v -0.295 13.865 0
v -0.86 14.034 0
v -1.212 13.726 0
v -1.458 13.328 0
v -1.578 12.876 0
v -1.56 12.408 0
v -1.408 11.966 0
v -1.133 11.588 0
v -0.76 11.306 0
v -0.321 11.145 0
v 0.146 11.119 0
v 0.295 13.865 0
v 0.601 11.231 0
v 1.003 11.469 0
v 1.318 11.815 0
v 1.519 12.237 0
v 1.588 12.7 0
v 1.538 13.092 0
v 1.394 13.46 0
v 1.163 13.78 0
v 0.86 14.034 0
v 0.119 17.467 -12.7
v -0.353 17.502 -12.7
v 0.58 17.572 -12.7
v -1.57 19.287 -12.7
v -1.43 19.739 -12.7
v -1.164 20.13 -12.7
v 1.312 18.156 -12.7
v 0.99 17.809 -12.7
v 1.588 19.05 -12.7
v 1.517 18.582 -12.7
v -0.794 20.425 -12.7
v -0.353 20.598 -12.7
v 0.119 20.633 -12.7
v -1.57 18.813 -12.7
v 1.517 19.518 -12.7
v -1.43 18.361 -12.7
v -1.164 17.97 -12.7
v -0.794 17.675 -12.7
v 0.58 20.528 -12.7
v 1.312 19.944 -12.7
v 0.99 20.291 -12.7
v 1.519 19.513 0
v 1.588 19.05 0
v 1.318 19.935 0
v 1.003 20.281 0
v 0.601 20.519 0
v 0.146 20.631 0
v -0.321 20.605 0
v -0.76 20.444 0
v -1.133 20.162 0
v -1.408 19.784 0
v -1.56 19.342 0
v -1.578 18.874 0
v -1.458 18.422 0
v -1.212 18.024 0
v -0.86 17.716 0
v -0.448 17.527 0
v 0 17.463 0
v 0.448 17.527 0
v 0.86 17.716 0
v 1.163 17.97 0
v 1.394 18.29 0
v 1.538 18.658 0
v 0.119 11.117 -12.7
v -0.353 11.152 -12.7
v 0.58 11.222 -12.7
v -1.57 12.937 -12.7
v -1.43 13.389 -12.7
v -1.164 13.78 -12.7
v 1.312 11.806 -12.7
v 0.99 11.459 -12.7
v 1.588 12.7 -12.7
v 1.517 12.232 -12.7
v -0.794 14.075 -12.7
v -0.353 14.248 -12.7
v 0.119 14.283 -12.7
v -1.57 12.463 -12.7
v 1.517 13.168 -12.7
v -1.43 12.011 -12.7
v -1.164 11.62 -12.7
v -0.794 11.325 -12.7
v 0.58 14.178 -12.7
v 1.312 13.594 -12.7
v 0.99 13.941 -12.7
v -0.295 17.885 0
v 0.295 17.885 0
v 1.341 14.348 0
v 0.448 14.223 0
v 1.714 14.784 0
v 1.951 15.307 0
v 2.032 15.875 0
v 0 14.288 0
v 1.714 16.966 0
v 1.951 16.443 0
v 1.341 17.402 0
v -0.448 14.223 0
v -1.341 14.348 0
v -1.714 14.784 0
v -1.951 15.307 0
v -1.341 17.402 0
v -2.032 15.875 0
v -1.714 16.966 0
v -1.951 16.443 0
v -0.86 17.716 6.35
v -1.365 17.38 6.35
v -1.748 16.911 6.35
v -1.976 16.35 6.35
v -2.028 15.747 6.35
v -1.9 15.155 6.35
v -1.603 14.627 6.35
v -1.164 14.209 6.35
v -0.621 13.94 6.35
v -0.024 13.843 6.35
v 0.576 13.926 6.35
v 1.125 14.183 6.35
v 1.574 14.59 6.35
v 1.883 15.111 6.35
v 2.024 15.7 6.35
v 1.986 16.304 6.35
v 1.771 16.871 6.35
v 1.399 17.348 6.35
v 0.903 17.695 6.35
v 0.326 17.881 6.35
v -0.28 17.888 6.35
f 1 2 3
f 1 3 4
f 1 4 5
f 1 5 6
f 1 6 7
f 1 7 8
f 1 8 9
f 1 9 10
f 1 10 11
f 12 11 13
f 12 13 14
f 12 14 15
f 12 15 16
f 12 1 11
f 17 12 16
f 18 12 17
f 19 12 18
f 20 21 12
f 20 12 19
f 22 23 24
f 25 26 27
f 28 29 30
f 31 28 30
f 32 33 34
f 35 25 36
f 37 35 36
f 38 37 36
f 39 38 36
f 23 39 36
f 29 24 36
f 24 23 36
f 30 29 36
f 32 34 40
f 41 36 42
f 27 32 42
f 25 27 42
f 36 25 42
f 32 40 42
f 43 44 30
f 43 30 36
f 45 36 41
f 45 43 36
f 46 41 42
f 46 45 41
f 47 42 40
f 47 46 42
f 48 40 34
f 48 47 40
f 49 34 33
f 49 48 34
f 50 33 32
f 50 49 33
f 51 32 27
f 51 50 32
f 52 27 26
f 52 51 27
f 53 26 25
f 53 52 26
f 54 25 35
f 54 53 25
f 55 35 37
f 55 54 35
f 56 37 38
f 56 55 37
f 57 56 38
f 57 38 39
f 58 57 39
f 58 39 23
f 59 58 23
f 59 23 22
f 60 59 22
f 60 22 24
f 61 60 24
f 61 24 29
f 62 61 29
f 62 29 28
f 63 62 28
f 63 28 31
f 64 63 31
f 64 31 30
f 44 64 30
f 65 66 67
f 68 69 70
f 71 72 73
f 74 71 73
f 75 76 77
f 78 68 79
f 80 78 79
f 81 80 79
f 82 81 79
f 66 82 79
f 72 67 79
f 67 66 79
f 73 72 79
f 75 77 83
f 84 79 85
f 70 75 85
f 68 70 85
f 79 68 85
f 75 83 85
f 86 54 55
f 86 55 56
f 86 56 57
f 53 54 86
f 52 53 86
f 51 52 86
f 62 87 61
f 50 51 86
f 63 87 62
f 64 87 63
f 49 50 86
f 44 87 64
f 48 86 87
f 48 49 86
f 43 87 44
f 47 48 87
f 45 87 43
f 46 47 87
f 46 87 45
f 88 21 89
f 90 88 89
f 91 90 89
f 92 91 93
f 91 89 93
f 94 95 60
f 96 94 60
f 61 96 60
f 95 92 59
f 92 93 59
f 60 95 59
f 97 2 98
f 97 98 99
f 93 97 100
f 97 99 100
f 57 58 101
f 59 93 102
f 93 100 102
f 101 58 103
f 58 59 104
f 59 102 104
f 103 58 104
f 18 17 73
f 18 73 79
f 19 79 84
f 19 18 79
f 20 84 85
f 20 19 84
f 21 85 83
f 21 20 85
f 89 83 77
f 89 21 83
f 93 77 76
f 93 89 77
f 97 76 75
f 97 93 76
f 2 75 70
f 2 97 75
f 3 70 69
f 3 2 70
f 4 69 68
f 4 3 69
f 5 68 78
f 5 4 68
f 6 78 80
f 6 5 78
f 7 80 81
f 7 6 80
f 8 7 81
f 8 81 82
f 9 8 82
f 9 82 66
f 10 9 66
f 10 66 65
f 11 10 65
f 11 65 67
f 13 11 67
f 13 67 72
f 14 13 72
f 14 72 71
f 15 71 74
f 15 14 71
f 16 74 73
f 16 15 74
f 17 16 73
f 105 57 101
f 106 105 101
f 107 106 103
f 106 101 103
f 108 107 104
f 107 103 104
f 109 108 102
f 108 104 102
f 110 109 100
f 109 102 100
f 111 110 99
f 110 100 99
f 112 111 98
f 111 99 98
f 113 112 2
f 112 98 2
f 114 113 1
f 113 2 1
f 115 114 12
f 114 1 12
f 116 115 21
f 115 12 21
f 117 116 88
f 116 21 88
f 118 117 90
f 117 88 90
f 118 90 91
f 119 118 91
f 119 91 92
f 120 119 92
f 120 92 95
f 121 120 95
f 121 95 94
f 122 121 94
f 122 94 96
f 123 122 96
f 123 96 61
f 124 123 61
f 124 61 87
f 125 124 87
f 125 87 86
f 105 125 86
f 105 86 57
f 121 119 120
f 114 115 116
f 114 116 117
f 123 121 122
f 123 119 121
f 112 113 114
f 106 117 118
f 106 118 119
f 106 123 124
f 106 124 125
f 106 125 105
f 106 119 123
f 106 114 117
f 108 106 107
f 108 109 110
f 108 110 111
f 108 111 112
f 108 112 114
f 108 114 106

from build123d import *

# Parameters (mm, degrees)
SKETCH1_R             = 1.5875
BOSS_EXTRUDE1_DEPTH   = 12.7
BOSS_EXTRUDE1_2_DEPTH = 12.7
SKETCH2_R             = 2.032
BOSS_EXTRUDE2_DEPTH   = 6.35


with BuildPart() as part:
    # Sketch1 → Boss-Extrude1 (new body)
    with BuildSketch(Plane.XY):
        with Locations((0, 12.7)):
            Circle(SKETCH1_R)
    extrude(amount=-BOSS_EXTRUDE1_DEPTH)



with BuildPart() as body_2:
    # Sketch1 → Boss-Extrude1 2 (new body)
    with BuildSketch(Plane.XY):
        with Locations((0, 19.05)):
            Circle(SKETCH1_R)
    extrude(amount=-BOSS_EXTRUDE1_2_DEPTH)


with BuildPart() as part_1:
    add(part.part)

    add(body_2.part)  # Boss-Extrude2 merges body 2
    # Sketch2 → Boss-Extrude2 (add)
    with BuildSketch(Plane.XY):
        with Locations(Location((0, 15.875, 0), (0, 0, 115.050153991))):
            Circle(SKETCH2_R)
    extrude(amount=BOSS_EXTRUDE2_DEPTH)


solid = part_1.part
